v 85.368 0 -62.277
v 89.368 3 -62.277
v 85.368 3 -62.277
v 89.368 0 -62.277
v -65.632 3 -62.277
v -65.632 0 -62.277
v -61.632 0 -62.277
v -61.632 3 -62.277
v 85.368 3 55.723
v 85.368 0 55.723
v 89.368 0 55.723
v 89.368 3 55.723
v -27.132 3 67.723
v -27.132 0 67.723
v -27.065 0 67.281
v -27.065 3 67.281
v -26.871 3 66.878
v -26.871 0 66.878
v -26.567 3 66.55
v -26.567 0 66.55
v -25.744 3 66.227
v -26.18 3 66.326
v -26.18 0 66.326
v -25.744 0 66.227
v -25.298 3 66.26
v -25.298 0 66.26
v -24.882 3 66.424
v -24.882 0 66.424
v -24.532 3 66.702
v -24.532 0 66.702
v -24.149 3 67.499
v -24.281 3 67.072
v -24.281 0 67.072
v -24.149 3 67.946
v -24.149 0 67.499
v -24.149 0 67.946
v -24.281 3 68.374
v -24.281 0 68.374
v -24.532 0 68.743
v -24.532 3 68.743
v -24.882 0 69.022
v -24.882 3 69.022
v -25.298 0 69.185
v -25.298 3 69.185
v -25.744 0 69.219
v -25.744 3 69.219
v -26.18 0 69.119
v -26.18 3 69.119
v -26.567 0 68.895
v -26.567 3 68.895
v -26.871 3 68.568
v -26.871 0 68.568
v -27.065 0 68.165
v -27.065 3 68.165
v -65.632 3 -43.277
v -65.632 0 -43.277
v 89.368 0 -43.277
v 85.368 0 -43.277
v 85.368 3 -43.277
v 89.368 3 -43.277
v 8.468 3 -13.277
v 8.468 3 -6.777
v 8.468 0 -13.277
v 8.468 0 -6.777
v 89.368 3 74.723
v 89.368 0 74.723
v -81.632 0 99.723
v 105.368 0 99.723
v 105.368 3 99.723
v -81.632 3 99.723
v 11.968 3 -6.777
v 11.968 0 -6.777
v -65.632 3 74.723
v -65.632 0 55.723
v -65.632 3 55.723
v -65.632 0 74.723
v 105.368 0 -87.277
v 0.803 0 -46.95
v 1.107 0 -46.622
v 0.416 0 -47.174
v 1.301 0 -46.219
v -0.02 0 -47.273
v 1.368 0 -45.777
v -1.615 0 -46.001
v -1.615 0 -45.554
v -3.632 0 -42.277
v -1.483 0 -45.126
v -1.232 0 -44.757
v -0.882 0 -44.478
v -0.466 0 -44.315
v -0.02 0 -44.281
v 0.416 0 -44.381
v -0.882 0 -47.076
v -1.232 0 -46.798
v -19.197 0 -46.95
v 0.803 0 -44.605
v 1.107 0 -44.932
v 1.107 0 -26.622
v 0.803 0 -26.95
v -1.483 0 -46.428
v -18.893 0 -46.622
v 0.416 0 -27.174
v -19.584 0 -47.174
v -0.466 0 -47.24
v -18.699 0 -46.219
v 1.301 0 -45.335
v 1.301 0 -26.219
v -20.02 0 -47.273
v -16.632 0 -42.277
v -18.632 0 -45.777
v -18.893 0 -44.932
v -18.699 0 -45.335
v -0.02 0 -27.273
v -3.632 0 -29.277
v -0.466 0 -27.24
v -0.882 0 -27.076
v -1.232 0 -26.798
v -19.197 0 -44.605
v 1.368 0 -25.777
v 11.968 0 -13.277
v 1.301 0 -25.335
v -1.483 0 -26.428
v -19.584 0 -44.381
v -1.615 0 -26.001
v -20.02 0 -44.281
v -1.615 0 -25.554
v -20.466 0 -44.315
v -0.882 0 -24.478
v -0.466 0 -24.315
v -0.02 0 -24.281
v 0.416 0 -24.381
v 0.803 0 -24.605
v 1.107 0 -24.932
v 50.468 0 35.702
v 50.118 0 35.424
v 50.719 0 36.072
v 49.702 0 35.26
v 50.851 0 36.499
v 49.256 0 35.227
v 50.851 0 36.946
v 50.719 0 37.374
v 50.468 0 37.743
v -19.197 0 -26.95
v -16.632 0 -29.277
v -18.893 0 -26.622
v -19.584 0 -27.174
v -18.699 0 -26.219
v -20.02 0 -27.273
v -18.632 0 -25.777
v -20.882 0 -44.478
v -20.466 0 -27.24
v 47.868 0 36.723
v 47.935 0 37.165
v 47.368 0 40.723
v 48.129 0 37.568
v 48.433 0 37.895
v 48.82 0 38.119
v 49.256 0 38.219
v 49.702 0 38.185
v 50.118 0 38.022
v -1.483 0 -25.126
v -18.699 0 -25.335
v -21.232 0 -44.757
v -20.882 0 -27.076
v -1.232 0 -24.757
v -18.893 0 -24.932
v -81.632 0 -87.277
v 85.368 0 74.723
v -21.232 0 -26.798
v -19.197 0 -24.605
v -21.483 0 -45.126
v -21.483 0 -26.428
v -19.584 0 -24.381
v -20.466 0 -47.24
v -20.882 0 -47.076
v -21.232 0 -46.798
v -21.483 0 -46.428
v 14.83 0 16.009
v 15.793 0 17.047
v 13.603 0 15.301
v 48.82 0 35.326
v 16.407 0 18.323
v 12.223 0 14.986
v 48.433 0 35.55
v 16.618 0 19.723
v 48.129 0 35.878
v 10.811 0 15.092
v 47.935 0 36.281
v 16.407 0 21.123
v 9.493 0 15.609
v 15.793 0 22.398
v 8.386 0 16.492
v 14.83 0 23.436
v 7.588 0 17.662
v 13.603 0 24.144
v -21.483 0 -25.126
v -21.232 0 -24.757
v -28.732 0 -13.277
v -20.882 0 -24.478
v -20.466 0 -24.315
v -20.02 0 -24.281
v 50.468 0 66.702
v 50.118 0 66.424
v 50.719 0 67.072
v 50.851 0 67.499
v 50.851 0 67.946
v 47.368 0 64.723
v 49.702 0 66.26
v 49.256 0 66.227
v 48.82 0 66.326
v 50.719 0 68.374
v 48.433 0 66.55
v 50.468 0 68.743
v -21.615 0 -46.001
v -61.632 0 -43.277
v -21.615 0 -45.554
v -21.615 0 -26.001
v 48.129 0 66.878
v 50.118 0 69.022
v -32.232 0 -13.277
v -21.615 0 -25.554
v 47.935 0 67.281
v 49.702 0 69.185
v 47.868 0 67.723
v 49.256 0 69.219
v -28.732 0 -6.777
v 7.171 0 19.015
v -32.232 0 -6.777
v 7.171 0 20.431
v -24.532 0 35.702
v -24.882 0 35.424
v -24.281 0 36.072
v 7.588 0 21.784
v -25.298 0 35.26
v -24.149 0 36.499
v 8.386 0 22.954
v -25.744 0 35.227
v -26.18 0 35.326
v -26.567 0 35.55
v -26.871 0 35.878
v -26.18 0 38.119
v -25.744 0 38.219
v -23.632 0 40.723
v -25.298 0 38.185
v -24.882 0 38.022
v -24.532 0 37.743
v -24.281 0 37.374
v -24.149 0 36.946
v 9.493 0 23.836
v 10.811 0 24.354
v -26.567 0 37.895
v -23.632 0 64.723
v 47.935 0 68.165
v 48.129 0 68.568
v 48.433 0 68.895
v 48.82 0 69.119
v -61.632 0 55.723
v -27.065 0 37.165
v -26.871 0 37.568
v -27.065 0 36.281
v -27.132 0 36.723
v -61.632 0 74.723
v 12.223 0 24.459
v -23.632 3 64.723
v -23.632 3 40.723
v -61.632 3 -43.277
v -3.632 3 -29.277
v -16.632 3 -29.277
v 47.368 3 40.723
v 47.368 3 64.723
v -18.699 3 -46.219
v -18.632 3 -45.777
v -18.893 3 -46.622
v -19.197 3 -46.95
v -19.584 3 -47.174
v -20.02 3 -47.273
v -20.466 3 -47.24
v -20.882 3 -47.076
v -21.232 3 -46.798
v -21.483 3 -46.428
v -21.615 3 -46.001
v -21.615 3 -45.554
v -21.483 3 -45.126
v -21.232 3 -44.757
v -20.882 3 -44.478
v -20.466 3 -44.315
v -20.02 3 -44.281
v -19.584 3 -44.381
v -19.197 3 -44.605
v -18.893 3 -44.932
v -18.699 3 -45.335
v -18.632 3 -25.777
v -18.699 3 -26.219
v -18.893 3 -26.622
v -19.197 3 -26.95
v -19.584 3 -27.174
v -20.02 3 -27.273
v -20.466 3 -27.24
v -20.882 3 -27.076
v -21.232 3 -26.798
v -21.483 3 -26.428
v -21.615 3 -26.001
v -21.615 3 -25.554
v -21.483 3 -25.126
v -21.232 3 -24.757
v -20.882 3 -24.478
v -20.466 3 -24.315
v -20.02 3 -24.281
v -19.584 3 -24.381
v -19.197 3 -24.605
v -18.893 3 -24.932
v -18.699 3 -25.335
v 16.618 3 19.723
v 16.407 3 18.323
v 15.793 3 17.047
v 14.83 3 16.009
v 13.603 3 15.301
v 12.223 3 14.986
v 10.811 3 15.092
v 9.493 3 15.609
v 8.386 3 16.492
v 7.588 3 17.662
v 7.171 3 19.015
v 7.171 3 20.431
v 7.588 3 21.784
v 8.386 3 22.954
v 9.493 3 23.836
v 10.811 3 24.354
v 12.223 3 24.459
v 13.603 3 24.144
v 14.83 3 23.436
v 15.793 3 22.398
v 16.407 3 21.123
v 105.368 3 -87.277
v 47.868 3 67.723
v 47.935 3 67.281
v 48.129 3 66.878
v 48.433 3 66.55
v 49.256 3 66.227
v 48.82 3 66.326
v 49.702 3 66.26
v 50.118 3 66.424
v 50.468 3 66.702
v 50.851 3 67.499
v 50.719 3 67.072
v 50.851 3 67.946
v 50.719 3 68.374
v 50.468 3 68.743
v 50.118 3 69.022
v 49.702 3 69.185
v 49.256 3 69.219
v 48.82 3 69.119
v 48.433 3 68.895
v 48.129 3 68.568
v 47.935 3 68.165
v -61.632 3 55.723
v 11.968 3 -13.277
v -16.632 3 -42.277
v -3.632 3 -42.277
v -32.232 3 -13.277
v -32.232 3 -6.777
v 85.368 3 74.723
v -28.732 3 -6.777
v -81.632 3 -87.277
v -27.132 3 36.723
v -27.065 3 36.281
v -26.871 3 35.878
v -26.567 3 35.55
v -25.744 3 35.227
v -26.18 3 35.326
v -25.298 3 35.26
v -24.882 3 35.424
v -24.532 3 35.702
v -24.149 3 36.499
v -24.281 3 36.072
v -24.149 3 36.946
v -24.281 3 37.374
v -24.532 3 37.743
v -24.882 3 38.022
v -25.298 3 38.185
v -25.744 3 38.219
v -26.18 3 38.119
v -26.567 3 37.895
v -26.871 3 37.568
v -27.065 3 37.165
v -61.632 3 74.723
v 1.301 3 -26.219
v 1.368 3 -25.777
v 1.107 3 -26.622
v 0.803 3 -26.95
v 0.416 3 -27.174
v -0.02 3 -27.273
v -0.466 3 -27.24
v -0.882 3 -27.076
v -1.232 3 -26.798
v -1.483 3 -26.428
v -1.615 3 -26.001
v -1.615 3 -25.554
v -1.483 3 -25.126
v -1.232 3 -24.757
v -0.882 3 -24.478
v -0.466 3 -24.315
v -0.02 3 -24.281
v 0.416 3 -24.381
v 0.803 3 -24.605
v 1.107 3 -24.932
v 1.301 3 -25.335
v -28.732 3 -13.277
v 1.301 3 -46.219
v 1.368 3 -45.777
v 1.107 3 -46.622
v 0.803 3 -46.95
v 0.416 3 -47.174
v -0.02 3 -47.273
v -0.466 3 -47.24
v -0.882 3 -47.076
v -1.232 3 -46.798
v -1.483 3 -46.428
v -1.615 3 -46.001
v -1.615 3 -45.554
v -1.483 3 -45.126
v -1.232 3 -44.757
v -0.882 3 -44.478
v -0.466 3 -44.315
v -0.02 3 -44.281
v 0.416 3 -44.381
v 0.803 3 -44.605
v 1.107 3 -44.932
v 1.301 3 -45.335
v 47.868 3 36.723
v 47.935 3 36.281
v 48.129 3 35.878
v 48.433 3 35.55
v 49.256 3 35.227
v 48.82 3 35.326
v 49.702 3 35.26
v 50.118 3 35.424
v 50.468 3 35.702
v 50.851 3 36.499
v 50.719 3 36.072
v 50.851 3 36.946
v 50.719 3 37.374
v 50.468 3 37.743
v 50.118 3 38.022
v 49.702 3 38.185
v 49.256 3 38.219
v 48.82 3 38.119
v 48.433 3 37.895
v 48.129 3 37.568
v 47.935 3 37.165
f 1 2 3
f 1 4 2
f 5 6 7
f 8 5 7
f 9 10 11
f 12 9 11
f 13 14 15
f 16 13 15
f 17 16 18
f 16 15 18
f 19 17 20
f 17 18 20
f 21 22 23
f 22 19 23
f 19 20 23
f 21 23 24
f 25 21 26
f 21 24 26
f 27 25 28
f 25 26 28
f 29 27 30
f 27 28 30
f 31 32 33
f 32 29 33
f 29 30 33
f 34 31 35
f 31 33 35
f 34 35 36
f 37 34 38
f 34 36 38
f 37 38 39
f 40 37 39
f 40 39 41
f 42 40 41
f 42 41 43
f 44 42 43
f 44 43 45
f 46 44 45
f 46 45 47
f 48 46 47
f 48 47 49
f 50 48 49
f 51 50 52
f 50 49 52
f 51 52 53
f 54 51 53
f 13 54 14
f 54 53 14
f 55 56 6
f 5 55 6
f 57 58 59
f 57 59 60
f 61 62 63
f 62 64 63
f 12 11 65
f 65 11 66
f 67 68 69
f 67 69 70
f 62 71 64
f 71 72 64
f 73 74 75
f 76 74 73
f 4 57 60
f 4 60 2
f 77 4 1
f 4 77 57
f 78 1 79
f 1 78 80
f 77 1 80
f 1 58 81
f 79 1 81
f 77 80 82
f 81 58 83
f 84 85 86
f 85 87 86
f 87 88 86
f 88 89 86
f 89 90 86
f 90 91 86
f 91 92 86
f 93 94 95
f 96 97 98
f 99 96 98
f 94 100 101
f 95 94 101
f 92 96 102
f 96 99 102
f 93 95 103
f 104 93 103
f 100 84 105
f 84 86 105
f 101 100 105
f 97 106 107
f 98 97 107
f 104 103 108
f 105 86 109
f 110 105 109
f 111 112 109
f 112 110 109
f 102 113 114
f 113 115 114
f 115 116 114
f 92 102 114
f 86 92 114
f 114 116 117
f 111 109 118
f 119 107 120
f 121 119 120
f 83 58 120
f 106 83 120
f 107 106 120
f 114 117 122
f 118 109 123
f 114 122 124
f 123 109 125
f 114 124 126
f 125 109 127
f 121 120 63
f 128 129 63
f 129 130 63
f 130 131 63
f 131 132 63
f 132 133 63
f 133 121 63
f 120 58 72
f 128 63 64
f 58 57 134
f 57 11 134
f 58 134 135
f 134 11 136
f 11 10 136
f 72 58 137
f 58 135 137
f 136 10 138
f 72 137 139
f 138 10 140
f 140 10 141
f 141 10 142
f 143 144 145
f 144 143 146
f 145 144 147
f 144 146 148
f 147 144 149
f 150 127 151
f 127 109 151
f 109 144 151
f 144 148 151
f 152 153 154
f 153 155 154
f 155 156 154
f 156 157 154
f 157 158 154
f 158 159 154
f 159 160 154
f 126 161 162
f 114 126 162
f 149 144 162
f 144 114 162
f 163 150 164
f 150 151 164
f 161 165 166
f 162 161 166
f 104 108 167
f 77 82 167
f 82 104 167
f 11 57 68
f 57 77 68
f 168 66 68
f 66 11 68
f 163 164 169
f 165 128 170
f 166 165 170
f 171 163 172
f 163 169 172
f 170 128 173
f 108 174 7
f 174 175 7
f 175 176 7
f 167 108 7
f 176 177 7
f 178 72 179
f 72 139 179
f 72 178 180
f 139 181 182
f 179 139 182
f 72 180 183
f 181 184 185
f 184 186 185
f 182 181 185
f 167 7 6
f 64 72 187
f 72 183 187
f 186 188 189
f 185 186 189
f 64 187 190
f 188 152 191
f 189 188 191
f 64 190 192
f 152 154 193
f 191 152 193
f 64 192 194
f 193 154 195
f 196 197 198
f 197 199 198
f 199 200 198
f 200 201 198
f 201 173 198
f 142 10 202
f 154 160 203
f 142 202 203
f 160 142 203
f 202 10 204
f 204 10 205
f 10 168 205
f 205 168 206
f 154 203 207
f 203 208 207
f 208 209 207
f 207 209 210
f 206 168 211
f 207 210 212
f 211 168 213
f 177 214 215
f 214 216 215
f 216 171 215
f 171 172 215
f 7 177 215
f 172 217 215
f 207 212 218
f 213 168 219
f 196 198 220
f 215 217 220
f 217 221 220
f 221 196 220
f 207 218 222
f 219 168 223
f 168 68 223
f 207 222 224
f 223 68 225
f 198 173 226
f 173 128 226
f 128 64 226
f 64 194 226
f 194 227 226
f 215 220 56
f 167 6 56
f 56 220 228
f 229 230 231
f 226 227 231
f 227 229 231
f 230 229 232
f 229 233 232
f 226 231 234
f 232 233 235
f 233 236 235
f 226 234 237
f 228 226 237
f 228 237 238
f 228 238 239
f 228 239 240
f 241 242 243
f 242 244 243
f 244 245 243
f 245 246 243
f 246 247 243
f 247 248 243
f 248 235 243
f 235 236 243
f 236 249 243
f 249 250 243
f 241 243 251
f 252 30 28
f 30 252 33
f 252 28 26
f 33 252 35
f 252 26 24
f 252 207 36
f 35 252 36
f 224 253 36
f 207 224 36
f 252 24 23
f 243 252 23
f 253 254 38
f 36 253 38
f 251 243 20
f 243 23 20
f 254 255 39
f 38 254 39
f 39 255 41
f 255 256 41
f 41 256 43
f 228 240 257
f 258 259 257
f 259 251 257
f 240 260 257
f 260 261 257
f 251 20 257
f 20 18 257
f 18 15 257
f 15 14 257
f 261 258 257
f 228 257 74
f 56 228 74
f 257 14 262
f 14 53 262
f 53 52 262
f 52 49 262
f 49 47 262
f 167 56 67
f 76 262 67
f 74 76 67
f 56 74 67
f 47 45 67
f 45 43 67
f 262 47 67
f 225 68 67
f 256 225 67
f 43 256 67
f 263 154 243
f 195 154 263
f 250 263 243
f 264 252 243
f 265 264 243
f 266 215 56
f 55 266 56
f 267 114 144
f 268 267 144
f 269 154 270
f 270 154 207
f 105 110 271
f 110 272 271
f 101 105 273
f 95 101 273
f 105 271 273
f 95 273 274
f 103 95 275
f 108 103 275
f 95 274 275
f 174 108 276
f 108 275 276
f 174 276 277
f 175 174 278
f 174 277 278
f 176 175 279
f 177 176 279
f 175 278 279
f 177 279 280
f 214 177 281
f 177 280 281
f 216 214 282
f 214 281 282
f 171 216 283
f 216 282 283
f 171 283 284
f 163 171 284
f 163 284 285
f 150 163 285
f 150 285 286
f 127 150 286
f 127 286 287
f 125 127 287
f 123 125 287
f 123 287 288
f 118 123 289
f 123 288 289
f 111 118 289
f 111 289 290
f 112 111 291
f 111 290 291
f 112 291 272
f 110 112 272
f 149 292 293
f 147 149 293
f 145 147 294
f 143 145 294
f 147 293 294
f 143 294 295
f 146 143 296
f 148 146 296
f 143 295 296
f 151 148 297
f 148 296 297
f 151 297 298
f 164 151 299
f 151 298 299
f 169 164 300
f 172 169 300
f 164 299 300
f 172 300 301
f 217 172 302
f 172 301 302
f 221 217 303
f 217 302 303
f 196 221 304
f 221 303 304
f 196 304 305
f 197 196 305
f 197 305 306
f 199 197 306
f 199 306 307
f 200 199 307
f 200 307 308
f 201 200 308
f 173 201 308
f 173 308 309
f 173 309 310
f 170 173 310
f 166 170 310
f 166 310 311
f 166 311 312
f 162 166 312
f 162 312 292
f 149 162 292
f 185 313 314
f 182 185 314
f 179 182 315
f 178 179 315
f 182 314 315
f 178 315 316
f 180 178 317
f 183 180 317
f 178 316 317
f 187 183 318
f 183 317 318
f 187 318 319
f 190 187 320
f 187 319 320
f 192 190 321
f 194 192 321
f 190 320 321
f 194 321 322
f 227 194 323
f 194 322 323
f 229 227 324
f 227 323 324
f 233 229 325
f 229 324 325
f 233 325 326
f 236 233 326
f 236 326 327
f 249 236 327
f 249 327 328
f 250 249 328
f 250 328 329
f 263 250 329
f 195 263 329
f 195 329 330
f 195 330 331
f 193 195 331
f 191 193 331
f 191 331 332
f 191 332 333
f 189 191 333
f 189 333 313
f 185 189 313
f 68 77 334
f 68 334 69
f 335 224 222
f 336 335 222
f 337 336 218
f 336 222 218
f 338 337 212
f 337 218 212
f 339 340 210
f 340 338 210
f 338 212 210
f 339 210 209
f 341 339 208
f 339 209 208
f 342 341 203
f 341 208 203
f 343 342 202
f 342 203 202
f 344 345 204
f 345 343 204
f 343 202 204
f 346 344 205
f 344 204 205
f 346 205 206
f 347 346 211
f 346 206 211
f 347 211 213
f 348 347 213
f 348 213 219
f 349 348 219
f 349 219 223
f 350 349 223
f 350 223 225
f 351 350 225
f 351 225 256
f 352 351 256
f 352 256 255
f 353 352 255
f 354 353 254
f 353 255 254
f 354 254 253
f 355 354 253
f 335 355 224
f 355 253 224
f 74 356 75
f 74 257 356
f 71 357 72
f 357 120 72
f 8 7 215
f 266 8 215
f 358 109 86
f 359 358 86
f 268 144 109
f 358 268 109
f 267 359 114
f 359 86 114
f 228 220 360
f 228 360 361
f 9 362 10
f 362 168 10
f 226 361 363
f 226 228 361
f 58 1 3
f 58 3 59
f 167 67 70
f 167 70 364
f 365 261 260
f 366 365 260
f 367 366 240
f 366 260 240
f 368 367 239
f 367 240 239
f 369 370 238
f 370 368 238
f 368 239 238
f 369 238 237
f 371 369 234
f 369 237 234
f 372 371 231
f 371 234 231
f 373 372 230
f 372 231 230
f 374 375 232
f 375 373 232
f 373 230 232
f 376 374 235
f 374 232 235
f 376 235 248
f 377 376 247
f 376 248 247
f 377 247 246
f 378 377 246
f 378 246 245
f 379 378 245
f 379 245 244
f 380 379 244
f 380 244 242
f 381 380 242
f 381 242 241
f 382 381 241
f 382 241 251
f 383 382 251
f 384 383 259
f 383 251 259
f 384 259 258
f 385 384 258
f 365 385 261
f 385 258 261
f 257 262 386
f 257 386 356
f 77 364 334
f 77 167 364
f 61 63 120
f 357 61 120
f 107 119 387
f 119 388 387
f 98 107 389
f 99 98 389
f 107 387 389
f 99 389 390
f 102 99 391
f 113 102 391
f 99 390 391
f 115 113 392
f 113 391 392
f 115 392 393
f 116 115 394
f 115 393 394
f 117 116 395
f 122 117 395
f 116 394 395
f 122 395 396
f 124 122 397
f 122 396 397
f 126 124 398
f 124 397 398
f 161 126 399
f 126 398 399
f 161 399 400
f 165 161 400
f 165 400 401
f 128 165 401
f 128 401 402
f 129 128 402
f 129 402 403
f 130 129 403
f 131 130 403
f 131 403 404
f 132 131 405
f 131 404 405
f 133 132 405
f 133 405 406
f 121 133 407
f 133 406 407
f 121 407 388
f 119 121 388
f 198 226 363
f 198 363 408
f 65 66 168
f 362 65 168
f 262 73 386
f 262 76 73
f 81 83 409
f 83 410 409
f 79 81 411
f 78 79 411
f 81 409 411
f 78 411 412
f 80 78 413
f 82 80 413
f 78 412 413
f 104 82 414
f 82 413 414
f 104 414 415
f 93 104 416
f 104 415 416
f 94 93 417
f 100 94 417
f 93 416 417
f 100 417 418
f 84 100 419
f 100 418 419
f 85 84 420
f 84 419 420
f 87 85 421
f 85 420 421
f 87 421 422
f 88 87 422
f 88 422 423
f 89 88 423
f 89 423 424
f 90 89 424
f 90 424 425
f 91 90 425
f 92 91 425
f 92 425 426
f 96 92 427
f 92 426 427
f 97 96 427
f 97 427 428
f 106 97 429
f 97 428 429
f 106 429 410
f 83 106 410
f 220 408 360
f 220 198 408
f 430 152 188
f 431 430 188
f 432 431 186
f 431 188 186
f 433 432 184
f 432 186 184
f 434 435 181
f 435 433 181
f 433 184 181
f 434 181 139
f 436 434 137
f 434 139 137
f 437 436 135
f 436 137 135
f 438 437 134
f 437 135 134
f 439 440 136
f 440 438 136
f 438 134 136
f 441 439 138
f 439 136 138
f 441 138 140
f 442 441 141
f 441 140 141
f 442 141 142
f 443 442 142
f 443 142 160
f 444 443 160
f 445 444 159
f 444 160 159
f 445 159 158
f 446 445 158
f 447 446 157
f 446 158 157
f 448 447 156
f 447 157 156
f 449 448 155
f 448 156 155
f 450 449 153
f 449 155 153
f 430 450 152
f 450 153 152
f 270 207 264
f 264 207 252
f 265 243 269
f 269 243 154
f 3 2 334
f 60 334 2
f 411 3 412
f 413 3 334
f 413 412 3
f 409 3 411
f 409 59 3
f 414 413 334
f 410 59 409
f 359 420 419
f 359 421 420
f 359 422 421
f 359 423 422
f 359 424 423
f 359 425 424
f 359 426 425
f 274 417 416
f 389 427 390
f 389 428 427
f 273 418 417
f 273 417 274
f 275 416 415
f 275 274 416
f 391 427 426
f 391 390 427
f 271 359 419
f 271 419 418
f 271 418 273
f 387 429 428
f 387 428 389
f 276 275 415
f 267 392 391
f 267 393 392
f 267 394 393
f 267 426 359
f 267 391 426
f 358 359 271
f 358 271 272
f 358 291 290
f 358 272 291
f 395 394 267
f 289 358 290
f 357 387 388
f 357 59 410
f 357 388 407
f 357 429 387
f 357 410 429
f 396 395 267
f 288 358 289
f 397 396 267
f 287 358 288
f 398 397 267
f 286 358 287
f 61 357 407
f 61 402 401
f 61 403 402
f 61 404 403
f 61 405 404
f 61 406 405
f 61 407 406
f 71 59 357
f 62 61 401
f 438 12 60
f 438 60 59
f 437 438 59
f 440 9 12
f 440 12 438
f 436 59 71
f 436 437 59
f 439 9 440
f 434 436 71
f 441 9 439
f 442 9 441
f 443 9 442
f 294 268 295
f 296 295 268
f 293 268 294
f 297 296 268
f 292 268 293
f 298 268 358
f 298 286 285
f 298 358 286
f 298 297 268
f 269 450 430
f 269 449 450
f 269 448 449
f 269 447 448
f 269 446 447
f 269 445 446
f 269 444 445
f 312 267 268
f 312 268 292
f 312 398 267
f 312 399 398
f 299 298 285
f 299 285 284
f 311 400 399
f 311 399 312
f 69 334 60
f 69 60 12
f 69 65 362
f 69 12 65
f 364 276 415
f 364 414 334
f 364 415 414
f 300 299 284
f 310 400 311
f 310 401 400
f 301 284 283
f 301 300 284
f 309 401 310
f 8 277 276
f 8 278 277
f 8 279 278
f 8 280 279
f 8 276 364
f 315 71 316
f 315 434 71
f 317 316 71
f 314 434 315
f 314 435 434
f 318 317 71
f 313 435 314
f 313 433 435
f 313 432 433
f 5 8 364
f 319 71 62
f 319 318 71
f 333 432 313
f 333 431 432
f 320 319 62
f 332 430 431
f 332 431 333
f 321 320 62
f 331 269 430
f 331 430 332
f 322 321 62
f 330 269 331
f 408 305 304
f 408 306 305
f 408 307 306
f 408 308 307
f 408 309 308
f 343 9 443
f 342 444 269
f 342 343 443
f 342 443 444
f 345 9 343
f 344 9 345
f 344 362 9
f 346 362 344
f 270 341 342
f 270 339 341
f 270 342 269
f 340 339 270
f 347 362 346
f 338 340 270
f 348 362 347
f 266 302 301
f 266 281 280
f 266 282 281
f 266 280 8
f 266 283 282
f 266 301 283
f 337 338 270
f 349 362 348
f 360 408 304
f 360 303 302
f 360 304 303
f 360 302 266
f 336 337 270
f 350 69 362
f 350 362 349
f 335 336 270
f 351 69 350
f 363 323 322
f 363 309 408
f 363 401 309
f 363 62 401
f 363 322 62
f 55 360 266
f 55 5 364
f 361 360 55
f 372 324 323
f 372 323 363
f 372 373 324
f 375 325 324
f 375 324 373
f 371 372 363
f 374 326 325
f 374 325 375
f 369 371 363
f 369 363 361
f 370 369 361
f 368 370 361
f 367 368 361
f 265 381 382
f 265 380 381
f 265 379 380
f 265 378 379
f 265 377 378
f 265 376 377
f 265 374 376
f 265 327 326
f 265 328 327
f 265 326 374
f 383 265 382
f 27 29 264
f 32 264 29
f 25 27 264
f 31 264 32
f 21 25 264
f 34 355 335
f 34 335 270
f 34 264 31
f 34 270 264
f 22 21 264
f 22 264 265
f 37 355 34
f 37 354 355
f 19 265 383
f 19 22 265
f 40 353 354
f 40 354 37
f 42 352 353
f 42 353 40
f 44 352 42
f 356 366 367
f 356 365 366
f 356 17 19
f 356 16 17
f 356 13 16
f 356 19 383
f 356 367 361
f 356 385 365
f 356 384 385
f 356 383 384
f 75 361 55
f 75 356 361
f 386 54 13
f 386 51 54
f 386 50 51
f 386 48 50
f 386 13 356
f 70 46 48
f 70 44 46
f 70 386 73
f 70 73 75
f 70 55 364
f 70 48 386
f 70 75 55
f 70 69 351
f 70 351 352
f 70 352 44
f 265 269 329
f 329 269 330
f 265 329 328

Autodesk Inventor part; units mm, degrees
ref_plane "YZ Plane" through (0, 0, 0) normal (1, 0, 0) x (0, 1, 0)
ref_plane "XZ Plane" through (0, 0, 0) normal (0, 1, 0) x (-1, 0, 0)
ref_plane "XY Plane" through (0, 0, 0) normal (0, 0, 1) x (1, 0, 0)
sketch "Boceto1" plane through (0, 0, 0) normal (0, 1, 0) x (-1, 0, 0)
  line L0 (-105.368, 99.7227) -> (81.632, 99.7227)
  line L1 (81.632, 99.7227) -> (81.632, -87.2773)
  line L2 (81.632, -87.2773) -> (-105.368, -87.2773)
  line L3 (-105.368, -87.2773) -> (-105.368, 99.7227)
  line L4 (-89.368, 74.7227) -> (-85.368, 74.7227)
  line L5 (-85.368, 74.7227) -> (-85.368, 55.7227)
  line L6 (-85.368, 55.7227) -> (-89.368, 55.7227)
  line L7 (-89.368, 55.7227) -> (-89.368, 74.7227)
  line L8 (-89.368, -62.2773) -> (-85.368, -62.2773)
  line L9 (-85.368, -62.2773) -> (-85.368, -43.2773)
  line L10 (-85.368, -43.2773) -> (-89.368, -43.2773)
  line L11 (-89.368, -43.2773) -> (-89.368, -62.2773)
  line L12 (-47.368, 64.7227) -> (23.632, 64.7227)
  line L13 (23.632, 64.7227) -> (23.632, 40.7227)
  line L14 (23.632, 40.7227) -> (-47.368, 40.7227)
  line L15 (-47.368, 40.7227) -> (-47.368, 64.7227)
  circle A0 centre (-49.368, 67.7227) radius 1.5
  line L16 (-51.868, 70.2227) -> (28.132, 70.2227)
  line L17 (28.132, 70.2227) -> (28.132, 34.2227)
  line L18 (28.132, 34.2227) -> (-51.868, 34.2227)
  line L19 (-51.868, 34.2227) -> (-51.868, 70.2227)
  circle A1 centre (25.632, 67.7227) radius 1.5
  circle A2 centre (-49.368, 36.7227) radius 1.5
  circle A3 centre (25.632, 36.7227) radius 1.5
  line L20 (3.632, -29.2773) -> (16.632, -29.2773)
  line L21 (16.632, -29.2773) -> (16.632, -42.2773)
  line L22 (16.632, -42.2773) -> (3.632, -42.2773)
  line L23 (3.632, -42.2773) -> (3.632, -29.2773)
  line L24 (-11.968, -6.7773) -> (-8.468, -6.7773)
  line L25 (-8.468, -6.7773) -> (-8.468, -13.2773)
  line L26 (-8.468, -13.2773) -> (-11.968, -13.2773)
  line L27 (-11.968, -13.2773) -> (-11.968, -6.7773)
  line L28 (32.232, -6.7773) -> (28.732, -6.7773)
  line L29 (28.732, -6.7773) -> (28.732, -13.2773)
  line L30 (28.732, -13.2773) -> (32.232, -13.2773)
  line L31 (32.232, -13.2773) -> (32.232, -6.7773)
  line L32 (65.632, 74.7227) -> (61.632, 74.7227)
  line L33 (61.632, 74.7227) -> (61.632, 55.7227)
  line L34 (61.632, 55.7227) -> (65.632, 55.7227)
  line L35 (65.632, 55.7227) -> (65.632, 74.7227)
  line L36 (65.632, -43.2773) -> (65.632, -62.2773)
  line L37 (65.632, -62.2773) -> (61.632, -62.2773)
  line L38 (61.632, -62.2773) -> (61.632, -43.2773)
  line L39 (61.632, -43.2773) -> (65.632, -43.2773)
  point P0 (0, 0)
  dimension "d0" = 187
  dimension "d1" = 187
  dimension "d2" = 16
  dimension "d3" = 25
  dimension "d4" = 19
  dimension "d5" = 4
  dimension "d7" = 71
  dimension "d8" = 58
  dimension "d10" = 3
  dimension "d11" = 36
  dimension "d12" = 80
  dimension "d13" = 4.5
  dimension "d14" = 5.5
  dimension "d15" = 2.5
  dimension "d16" = 2.5
  dimension "d17" = 35
  dimension "d26" = 16
  dimension "d27" = 25
  dimension "d28" = 4
  dimension "d29" = 19
  dimension "d30" = 2.5
  dimension "d31" = 2.5
  dimension "d32" = 2.5
  dimension "d33" = 2.5
  dimension "d34" = 2.5
  dimension "d35" = 2.5
  dimension "d36" = 13
  dimension "d37" = 13
  dimension "d38" = 65
  dimension "d39" = 45
  dimension "d40" = 6.5
  dimension "d41" = 3.5
  dimension "d42" = 29
  dimension "d45" = 29
  dimension "d46" = 3.5
  dimension "d47" = 6.5
  dimension "d48" = 16
  dimension "d49" = 19
  dimension "d50" = 4
  dimension "d51" = 25
  dimension "d52" = 16
  dimension "d53" = 4
  dimension "d54" = 19
  dimension "d55" = 25
  dimension "d72" = 37.2
  dimension "d73" = 12.1
  dimension "d74" = 24
extrude "Extrusión1" add sketch "Boceto1" along normal blind 3 contours L0 L1 L2 L3 | L16 L17 L18 L19
sketch "Boceto2" plane through (0, 3, 0) normal (0, 1, 0) x (1, 0, 0)
  line L0 (-16.632, 29.2773) -> (-16.632, 42.2773) projected
  line L1 (-16.632, 42.2773) -> (-3.632, 42.2773) projected
  line L2 (-3.632, 42.2773) -> (-3.632, 29.2773) projected
  line L3 (-3.632, 29.2773) -> (-16.632, 29.2773) projected
  line L4 (3.368, 22.2773) -> (-23.632, 22.2773)
  line L5 (-23.632, 22.2773) -> (-23.632, 49.2773)
  line L6 (-23.632, 49.2773) -> (3.368, 49.2773)
  line L7 (3.368, 49.2773) -> (3.368, 22.2773)
  circle A0 centre (-0.132, 25.7773) radius 1.5
  line L8 (-10.132, 22.2773) -> (-10.132, 49.2773)
  line L9 (3.368, 35.7773) -> (-23.632, 35.7773)
  circle A1 centre (-20.132, 25.7773) radius 1.5
  circle A2 centre (-0.132, 45.7773) radius 1.5
  circle A3 centre (-20.132, 45.7773) radius 1.5
  point P0 (0, 0)
  dimension "d58" = 7
  dimension "d59" = 7
  dimension "d60" = 7
  dimension "d61" = 7
  dimension "d62" = 3
  dimension "d63" = 3.5
  dimension "d64" = 3.5
  dimension "d75" = 3.5
extrude "Extrusión2" cut sketch "Boceto2" against normal through all contours A0 | A1 | A2 | A3
sketch "Boceto3" plane through (0, 3, 0) normal (0, 1, 0) x (1, 0, 0)
  line L0 (-81.632, -99.7227) -> (105.368, -99.7227) projected
  line L1 (-81.632, 87.2773) -> (-81.632, -99.7227) projected
  circle A0 centre (11.868, -19.7227) radius 4.75
  point P0 (0, 0)
  dimension "d67" = 9.5
  dimension "d68" = 93.5
  dimension "d69" = 80
extrude "Extrusión3" cut sketch "Boceto3" against normal through all
properties part number "Tapa final"
